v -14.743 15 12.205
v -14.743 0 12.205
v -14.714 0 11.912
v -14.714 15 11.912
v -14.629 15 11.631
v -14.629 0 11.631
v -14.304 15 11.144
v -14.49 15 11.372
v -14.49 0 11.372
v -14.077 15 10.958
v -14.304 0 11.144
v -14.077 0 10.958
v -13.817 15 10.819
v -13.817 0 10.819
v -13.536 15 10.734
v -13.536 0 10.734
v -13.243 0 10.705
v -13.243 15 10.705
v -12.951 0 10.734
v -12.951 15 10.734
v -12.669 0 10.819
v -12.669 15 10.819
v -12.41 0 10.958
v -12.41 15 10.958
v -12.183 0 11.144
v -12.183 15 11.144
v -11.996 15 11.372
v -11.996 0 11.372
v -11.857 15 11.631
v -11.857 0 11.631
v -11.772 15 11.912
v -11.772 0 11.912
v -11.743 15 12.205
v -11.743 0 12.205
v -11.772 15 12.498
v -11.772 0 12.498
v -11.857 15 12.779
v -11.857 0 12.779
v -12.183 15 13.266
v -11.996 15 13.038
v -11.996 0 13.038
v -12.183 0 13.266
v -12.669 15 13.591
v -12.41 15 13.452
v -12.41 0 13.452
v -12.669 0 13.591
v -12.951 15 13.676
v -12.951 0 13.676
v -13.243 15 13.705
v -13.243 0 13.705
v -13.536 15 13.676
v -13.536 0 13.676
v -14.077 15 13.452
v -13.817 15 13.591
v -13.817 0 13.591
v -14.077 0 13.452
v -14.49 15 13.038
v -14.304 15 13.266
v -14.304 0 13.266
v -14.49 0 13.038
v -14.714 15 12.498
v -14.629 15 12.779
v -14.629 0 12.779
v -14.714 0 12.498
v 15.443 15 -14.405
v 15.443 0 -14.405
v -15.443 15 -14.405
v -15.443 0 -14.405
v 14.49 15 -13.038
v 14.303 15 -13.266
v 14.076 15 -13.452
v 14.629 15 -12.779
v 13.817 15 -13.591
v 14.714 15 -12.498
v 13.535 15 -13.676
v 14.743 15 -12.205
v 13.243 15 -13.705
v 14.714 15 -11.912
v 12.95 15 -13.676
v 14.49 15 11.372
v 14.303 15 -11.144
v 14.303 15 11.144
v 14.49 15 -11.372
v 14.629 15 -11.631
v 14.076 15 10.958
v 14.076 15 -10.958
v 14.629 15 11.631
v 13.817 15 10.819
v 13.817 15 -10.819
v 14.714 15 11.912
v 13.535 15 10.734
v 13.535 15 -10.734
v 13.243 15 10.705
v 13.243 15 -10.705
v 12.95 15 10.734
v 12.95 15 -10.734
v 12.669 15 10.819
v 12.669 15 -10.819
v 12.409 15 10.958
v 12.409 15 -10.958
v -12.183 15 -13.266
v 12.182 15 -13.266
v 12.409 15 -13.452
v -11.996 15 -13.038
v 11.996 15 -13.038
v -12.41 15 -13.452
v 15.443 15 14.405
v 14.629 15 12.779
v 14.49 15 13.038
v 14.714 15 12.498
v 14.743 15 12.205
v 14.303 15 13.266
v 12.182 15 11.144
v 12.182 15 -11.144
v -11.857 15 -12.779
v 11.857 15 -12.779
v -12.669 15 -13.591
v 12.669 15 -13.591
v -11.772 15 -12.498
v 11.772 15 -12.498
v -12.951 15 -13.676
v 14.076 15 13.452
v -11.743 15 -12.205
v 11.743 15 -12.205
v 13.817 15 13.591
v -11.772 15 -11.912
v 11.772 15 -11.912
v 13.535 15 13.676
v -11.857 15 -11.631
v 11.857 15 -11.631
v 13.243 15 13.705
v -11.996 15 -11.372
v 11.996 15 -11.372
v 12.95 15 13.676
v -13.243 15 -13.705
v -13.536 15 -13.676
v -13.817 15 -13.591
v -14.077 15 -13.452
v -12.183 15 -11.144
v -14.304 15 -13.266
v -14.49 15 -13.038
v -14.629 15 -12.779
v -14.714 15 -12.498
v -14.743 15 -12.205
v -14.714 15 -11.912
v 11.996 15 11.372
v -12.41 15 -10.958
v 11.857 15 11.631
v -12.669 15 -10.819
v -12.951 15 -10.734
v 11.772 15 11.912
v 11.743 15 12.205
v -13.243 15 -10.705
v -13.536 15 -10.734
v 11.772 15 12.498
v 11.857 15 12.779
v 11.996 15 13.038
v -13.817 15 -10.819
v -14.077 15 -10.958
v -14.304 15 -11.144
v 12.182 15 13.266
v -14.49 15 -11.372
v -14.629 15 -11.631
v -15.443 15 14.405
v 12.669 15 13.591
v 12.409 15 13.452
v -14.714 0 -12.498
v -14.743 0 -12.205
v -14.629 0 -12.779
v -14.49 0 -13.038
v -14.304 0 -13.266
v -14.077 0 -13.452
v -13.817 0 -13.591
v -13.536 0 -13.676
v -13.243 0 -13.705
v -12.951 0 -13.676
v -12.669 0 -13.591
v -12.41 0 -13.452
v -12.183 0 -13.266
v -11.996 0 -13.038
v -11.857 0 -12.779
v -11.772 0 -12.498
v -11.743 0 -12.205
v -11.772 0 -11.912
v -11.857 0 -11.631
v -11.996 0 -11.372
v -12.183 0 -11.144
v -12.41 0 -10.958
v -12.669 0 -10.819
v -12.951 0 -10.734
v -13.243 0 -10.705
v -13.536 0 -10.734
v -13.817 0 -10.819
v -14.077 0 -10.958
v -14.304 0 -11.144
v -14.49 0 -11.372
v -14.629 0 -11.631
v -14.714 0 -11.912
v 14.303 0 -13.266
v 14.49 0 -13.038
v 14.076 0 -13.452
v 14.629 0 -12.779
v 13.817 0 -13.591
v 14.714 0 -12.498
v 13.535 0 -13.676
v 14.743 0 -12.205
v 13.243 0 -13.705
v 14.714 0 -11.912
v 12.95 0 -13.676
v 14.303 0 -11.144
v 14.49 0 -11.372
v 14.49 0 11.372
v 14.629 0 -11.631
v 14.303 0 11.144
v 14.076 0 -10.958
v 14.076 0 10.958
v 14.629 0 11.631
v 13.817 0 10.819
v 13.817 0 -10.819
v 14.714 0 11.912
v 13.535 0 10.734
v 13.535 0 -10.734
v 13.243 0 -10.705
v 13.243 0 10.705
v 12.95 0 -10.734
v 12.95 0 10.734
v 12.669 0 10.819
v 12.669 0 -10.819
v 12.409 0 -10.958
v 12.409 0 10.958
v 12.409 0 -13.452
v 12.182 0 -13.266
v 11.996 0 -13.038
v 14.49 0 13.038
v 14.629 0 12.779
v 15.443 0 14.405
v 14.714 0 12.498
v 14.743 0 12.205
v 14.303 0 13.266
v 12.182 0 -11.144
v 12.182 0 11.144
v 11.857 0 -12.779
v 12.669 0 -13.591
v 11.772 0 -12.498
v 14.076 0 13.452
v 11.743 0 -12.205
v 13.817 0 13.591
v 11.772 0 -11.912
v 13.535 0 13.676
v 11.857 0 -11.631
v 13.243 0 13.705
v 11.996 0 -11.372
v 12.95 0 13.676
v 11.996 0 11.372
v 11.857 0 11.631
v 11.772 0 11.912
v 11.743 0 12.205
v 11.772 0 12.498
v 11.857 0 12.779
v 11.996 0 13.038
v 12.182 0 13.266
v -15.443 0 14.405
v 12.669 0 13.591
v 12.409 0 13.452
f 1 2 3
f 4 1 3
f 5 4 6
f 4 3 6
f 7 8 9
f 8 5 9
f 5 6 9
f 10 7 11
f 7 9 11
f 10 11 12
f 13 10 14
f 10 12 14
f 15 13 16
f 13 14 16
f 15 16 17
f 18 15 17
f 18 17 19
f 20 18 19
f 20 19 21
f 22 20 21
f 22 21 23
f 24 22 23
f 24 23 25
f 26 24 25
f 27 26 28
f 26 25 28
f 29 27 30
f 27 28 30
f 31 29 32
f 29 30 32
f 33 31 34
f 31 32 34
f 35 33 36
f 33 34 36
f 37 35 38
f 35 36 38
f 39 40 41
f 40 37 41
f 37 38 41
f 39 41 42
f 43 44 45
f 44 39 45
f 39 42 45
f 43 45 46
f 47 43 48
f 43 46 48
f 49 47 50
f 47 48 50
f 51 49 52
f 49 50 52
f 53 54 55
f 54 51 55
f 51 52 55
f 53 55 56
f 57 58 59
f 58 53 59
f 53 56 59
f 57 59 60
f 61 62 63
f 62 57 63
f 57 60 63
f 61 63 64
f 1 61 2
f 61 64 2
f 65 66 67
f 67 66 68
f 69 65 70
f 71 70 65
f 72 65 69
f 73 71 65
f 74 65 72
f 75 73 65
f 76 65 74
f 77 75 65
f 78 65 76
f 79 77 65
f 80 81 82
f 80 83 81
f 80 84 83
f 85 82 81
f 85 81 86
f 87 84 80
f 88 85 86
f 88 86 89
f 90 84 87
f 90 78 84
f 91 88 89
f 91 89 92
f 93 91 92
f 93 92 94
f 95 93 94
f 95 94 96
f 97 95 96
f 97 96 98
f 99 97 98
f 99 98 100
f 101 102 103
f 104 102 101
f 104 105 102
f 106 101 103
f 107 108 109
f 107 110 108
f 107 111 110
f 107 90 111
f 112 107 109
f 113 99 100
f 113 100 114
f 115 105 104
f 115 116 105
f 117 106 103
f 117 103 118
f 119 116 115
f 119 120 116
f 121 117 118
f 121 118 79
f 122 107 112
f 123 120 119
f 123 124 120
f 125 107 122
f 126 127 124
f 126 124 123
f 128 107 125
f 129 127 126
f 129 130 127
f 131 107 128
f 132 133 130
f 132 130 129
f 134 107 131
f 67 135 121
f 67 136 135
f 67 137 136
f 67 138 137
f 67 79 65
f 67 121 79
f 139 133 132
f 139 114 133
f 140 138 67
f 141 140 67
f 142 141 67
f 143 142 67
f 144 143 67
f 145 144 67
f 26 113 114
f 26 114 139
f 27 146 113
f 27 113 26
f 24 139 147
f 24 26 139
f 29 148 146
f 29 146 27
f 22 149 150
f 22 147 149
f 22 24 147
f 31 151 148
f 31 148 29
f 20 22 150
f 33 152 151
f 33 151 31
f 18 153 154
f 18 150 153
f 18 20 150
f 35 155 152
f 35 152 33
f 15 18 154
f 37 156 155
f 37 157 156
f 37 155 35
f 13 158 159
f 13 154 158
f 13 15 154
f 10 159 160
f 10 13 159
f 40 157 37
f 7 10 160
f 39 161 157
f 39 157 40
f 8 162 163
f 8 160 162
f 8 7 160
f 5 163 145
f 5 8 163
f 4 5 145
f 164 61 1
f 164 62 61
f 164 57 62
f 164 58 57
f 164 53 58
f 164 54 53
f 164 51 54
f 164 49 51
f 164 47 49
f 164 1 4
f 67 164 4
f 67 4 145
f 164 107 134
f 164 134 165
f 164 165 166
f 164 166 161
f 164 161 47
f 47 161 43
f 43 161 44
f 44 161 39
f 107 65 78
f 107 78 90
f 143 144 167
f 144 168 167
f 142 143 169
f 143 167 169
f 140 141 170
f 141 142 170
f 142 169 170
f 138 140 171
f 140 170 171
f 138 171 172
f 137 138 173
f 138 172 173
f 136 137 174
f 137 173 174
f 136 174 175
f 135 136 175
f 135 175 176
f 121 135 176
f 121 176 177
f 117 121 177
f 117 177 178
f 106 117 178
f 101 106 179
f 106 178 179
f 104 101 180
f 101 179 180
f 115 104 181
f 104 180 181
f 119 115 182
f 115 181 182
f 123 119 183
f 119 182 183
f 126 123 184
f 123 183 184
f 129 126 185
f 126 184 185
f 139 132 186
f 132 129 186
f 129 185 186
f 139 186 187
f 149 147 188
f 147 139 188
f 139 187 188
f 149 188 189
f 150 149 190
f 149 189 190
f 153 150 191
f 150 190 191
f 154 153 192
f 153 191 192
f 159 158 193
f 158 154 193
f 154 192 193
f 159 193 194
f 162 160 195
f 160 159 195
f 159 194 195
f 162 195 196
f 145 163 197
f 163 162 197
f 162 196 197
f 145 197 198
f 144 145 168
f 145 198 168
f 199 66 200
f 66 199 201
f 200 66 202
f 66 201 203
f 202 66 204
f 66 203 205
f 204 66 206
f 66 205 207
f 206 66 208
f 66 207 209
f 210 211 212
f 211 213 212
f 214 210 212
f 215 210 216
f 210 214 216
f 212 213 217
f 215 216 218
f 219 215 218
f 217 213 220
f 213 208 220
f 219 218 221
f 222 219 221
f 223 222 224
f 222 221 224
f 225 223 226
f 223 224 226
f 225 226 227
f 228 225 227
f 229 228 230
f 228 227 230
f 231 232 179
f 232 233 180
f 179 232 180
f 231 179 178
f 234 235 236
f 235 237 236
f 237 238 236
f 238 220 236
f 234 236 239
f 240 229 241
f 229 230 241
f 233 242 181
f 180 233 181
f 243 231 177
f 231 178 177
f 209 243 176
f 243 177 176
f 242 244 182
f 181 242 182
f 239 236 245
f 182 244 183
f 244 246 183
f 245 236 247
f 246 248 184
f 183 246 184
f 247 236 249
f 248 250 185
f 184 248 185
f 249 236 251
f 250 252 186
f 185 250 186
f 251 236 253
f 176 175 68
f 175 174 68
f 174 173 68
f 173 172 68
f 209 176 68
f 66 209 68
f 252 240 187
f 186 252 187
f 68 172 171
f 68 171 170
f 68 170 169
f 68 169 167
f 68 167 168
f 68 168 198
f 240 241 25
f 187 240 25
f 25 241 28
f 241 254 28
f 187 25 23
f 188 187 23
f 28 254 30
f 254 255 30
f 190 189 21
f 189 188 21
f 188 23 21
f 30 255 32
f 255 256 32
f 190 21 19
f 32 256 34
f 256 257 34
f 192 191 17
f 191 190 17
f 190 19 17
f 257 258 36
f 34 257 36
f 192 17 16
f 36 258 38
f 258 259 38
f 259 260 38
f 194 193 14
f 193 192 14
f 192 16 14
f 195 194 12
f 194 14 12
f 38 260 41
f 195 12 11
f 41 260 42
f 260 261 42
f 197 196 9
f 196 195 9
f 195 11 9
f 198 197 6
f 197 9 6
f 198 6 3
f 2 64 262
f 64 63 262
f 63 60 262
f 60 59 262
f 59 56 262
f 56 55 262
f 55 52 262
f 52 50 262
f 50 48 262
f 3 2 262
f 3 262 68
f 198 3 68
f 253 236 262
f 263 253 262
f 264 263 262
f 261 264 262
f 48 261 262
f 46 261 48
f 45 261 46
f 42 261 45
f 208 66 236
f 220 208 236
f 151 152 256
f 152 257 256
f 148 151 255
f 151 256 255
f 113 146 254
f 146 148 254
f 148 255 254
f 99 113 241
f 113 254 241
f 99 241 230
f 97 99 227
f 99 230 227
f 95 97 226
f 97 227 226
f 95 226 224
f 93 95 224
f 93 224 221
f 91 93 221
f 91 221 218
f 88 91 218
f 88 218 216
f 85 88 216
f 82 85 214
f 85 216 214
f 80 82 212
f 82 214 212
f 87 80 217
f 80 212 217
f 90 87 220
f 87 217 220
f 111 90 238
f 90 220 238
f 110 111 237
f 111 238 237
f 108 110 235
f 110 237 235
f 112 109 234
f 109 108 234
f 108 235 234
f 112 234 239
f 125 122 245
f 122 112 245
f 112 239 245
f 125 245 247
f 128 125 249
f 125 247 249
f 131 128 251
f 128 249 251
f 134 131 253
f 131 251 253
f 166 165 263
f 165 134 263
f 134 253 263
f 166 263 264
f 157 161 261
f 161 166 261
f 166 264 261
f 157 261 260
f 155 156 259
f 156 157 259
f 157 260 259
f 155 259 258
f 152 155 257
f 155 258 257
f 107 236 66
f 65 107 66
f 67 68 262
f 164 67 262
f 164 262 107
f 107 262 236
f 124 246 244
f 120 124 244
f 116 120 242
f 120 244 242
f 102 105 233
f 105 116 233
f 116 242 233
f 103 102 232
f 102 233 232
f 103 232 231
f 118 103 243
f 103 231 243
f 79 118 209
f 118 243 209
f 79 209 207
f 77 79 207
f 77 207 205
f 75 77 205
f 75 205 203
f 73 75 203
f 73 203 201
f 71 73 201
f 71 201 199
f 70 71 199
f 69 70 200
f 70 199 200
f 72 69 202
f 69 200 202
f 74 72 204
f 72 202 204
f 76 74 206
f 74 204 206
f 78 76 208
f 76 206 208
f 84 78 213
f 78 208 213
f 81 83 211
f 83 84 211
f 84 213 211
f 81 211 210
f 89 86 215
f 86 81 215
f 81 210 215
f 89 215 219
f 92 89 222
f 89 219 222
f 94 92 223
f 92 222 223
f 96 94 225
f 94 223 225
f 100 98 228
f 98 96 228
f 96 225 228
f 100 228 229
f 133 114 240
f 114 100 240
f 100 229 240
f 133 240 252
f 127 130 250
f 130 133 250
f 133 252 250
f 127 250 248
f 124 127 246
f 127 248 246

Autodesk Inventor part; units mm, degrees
ref_plane "YZ Plane" through (0, 0, 0) normal (1, 0, 0) x (0, 1, 0)
ref_plane "XZ Plane" through (0, 0, 0) normal (0, 1, 0) x (-1, 0, 0)
ref_plane "XY Plane" through (0, 0, 0) normal (0, 0, 1) x (1, 0, 0)
sketch "Sketch1" plane through (0, 0, 0) normal (0, 1, 0) x (-1, 0, 0)
  line L0 (15.4432, 14.405) -> (-15.4432, 14.405)
  line L1 (-15.4432, 14.405) -> (-15.4432, -14.405)
  line L2 (-15.4432, -14.405) -> (15.4432, -14.405)
  line L3 (15.4432, -14.405) -> (15.4432, 14.405)
  circle A0 centre (13.2432, -12.205) radius 1.5
  circle A1 centre (13.2432, 12.205) radius 1.5
  circle A2 centre (-13.2428, -12.205) radius 1.5
  circle A3 centre (-13.2428, 12.205) radius 1.5
  point P0 (0, 0)
  dimension "d0" = 30.8864
  dimension "d1" = 28.81
  dimension "d2" = 3
  dimension "d6" = 2.2
  dimension "d7" = 2.2
  dimension "d16" = 24.41
  dimension "d19" = 26.486
extrude "Extrusion1" add sketch "Sketch1" along normal blind 15
sketch "Sketch2" plane through (0, 0, 0) normal (0, -1, 0) x (1, 0, 0)
  circle A0 centre (13.2428, 12.205) radius 1.5 projected
  circle A1 centre (13.2428, -12.205) radius 1.5 projected
  circle A2 centre (-13.2432, 12.205) radius 1.5 projected
  circle A3 centre (-13.2432, -12.205) radius 1.5 projected
  line L0 (-15.4432, 14.405) -> (15.4432, 14.405) projected
  line L1 (-15.4432, -14.405) -> (-15.4432, 14.405) projected
  line L2 (15.4432, -14.405) -> (-15.4432, -14.405) projected
  line L3 (15.4432, 14.405) -> (15.4432, -14.405) projected
  circle A4 centre (13.2428, -12.205) radius 1.5 projected
  line L4 (13.2428, -12.205) -> (-13.2432, 12.205)
  circle A5 centre (-13.2432, -12.205) radius 1.5 projected
  line L5 (13.2428, 12.205) -> (-13.2432, -12.205)
  point P0 (0, 0)
sketch "Sketch3" plane through (0, 15, 0) normal (0, 1, 0) x (1, 0, 0)
  circle A0 centre (13.2428, -12.205) radius 1.5 projected
  circle A1 centre (13.2428, 12.205) radius 1.5 projected
  circle A2 centre (-13.2432, -12.205) radius 1.5 projected
  circle A3 centre (-13.2432, 12.205) radius 1.5 projected
  line L0 (-15.4432, -14.405) -> (15.4432, -14.405) projected
  line L1 (15.4432, -14.405) -> (15.4432, 14.405) projected
  line L2 (15.4432, 14.405) -> (-15.4432, 14.405) projected
  line L3 (-15.4432, 14.405) -> (-15.4432, -14.405) projected
  line L4 (23.1035, -2.0134) -> (-26.5318, -2.0134) construction
  line L5 (-26.5318, -2.0134) -> (-26.5318, 1.4328) construction
  line L6 (-26.5318, 1.4328) -> (23.1035, 1.4328) construction
  line L7 (23.1035, 1.4328) -> (23.1035, -2.0134) construction
  point P0 (0, 0)
properties part number "SoundDetectBaru"
